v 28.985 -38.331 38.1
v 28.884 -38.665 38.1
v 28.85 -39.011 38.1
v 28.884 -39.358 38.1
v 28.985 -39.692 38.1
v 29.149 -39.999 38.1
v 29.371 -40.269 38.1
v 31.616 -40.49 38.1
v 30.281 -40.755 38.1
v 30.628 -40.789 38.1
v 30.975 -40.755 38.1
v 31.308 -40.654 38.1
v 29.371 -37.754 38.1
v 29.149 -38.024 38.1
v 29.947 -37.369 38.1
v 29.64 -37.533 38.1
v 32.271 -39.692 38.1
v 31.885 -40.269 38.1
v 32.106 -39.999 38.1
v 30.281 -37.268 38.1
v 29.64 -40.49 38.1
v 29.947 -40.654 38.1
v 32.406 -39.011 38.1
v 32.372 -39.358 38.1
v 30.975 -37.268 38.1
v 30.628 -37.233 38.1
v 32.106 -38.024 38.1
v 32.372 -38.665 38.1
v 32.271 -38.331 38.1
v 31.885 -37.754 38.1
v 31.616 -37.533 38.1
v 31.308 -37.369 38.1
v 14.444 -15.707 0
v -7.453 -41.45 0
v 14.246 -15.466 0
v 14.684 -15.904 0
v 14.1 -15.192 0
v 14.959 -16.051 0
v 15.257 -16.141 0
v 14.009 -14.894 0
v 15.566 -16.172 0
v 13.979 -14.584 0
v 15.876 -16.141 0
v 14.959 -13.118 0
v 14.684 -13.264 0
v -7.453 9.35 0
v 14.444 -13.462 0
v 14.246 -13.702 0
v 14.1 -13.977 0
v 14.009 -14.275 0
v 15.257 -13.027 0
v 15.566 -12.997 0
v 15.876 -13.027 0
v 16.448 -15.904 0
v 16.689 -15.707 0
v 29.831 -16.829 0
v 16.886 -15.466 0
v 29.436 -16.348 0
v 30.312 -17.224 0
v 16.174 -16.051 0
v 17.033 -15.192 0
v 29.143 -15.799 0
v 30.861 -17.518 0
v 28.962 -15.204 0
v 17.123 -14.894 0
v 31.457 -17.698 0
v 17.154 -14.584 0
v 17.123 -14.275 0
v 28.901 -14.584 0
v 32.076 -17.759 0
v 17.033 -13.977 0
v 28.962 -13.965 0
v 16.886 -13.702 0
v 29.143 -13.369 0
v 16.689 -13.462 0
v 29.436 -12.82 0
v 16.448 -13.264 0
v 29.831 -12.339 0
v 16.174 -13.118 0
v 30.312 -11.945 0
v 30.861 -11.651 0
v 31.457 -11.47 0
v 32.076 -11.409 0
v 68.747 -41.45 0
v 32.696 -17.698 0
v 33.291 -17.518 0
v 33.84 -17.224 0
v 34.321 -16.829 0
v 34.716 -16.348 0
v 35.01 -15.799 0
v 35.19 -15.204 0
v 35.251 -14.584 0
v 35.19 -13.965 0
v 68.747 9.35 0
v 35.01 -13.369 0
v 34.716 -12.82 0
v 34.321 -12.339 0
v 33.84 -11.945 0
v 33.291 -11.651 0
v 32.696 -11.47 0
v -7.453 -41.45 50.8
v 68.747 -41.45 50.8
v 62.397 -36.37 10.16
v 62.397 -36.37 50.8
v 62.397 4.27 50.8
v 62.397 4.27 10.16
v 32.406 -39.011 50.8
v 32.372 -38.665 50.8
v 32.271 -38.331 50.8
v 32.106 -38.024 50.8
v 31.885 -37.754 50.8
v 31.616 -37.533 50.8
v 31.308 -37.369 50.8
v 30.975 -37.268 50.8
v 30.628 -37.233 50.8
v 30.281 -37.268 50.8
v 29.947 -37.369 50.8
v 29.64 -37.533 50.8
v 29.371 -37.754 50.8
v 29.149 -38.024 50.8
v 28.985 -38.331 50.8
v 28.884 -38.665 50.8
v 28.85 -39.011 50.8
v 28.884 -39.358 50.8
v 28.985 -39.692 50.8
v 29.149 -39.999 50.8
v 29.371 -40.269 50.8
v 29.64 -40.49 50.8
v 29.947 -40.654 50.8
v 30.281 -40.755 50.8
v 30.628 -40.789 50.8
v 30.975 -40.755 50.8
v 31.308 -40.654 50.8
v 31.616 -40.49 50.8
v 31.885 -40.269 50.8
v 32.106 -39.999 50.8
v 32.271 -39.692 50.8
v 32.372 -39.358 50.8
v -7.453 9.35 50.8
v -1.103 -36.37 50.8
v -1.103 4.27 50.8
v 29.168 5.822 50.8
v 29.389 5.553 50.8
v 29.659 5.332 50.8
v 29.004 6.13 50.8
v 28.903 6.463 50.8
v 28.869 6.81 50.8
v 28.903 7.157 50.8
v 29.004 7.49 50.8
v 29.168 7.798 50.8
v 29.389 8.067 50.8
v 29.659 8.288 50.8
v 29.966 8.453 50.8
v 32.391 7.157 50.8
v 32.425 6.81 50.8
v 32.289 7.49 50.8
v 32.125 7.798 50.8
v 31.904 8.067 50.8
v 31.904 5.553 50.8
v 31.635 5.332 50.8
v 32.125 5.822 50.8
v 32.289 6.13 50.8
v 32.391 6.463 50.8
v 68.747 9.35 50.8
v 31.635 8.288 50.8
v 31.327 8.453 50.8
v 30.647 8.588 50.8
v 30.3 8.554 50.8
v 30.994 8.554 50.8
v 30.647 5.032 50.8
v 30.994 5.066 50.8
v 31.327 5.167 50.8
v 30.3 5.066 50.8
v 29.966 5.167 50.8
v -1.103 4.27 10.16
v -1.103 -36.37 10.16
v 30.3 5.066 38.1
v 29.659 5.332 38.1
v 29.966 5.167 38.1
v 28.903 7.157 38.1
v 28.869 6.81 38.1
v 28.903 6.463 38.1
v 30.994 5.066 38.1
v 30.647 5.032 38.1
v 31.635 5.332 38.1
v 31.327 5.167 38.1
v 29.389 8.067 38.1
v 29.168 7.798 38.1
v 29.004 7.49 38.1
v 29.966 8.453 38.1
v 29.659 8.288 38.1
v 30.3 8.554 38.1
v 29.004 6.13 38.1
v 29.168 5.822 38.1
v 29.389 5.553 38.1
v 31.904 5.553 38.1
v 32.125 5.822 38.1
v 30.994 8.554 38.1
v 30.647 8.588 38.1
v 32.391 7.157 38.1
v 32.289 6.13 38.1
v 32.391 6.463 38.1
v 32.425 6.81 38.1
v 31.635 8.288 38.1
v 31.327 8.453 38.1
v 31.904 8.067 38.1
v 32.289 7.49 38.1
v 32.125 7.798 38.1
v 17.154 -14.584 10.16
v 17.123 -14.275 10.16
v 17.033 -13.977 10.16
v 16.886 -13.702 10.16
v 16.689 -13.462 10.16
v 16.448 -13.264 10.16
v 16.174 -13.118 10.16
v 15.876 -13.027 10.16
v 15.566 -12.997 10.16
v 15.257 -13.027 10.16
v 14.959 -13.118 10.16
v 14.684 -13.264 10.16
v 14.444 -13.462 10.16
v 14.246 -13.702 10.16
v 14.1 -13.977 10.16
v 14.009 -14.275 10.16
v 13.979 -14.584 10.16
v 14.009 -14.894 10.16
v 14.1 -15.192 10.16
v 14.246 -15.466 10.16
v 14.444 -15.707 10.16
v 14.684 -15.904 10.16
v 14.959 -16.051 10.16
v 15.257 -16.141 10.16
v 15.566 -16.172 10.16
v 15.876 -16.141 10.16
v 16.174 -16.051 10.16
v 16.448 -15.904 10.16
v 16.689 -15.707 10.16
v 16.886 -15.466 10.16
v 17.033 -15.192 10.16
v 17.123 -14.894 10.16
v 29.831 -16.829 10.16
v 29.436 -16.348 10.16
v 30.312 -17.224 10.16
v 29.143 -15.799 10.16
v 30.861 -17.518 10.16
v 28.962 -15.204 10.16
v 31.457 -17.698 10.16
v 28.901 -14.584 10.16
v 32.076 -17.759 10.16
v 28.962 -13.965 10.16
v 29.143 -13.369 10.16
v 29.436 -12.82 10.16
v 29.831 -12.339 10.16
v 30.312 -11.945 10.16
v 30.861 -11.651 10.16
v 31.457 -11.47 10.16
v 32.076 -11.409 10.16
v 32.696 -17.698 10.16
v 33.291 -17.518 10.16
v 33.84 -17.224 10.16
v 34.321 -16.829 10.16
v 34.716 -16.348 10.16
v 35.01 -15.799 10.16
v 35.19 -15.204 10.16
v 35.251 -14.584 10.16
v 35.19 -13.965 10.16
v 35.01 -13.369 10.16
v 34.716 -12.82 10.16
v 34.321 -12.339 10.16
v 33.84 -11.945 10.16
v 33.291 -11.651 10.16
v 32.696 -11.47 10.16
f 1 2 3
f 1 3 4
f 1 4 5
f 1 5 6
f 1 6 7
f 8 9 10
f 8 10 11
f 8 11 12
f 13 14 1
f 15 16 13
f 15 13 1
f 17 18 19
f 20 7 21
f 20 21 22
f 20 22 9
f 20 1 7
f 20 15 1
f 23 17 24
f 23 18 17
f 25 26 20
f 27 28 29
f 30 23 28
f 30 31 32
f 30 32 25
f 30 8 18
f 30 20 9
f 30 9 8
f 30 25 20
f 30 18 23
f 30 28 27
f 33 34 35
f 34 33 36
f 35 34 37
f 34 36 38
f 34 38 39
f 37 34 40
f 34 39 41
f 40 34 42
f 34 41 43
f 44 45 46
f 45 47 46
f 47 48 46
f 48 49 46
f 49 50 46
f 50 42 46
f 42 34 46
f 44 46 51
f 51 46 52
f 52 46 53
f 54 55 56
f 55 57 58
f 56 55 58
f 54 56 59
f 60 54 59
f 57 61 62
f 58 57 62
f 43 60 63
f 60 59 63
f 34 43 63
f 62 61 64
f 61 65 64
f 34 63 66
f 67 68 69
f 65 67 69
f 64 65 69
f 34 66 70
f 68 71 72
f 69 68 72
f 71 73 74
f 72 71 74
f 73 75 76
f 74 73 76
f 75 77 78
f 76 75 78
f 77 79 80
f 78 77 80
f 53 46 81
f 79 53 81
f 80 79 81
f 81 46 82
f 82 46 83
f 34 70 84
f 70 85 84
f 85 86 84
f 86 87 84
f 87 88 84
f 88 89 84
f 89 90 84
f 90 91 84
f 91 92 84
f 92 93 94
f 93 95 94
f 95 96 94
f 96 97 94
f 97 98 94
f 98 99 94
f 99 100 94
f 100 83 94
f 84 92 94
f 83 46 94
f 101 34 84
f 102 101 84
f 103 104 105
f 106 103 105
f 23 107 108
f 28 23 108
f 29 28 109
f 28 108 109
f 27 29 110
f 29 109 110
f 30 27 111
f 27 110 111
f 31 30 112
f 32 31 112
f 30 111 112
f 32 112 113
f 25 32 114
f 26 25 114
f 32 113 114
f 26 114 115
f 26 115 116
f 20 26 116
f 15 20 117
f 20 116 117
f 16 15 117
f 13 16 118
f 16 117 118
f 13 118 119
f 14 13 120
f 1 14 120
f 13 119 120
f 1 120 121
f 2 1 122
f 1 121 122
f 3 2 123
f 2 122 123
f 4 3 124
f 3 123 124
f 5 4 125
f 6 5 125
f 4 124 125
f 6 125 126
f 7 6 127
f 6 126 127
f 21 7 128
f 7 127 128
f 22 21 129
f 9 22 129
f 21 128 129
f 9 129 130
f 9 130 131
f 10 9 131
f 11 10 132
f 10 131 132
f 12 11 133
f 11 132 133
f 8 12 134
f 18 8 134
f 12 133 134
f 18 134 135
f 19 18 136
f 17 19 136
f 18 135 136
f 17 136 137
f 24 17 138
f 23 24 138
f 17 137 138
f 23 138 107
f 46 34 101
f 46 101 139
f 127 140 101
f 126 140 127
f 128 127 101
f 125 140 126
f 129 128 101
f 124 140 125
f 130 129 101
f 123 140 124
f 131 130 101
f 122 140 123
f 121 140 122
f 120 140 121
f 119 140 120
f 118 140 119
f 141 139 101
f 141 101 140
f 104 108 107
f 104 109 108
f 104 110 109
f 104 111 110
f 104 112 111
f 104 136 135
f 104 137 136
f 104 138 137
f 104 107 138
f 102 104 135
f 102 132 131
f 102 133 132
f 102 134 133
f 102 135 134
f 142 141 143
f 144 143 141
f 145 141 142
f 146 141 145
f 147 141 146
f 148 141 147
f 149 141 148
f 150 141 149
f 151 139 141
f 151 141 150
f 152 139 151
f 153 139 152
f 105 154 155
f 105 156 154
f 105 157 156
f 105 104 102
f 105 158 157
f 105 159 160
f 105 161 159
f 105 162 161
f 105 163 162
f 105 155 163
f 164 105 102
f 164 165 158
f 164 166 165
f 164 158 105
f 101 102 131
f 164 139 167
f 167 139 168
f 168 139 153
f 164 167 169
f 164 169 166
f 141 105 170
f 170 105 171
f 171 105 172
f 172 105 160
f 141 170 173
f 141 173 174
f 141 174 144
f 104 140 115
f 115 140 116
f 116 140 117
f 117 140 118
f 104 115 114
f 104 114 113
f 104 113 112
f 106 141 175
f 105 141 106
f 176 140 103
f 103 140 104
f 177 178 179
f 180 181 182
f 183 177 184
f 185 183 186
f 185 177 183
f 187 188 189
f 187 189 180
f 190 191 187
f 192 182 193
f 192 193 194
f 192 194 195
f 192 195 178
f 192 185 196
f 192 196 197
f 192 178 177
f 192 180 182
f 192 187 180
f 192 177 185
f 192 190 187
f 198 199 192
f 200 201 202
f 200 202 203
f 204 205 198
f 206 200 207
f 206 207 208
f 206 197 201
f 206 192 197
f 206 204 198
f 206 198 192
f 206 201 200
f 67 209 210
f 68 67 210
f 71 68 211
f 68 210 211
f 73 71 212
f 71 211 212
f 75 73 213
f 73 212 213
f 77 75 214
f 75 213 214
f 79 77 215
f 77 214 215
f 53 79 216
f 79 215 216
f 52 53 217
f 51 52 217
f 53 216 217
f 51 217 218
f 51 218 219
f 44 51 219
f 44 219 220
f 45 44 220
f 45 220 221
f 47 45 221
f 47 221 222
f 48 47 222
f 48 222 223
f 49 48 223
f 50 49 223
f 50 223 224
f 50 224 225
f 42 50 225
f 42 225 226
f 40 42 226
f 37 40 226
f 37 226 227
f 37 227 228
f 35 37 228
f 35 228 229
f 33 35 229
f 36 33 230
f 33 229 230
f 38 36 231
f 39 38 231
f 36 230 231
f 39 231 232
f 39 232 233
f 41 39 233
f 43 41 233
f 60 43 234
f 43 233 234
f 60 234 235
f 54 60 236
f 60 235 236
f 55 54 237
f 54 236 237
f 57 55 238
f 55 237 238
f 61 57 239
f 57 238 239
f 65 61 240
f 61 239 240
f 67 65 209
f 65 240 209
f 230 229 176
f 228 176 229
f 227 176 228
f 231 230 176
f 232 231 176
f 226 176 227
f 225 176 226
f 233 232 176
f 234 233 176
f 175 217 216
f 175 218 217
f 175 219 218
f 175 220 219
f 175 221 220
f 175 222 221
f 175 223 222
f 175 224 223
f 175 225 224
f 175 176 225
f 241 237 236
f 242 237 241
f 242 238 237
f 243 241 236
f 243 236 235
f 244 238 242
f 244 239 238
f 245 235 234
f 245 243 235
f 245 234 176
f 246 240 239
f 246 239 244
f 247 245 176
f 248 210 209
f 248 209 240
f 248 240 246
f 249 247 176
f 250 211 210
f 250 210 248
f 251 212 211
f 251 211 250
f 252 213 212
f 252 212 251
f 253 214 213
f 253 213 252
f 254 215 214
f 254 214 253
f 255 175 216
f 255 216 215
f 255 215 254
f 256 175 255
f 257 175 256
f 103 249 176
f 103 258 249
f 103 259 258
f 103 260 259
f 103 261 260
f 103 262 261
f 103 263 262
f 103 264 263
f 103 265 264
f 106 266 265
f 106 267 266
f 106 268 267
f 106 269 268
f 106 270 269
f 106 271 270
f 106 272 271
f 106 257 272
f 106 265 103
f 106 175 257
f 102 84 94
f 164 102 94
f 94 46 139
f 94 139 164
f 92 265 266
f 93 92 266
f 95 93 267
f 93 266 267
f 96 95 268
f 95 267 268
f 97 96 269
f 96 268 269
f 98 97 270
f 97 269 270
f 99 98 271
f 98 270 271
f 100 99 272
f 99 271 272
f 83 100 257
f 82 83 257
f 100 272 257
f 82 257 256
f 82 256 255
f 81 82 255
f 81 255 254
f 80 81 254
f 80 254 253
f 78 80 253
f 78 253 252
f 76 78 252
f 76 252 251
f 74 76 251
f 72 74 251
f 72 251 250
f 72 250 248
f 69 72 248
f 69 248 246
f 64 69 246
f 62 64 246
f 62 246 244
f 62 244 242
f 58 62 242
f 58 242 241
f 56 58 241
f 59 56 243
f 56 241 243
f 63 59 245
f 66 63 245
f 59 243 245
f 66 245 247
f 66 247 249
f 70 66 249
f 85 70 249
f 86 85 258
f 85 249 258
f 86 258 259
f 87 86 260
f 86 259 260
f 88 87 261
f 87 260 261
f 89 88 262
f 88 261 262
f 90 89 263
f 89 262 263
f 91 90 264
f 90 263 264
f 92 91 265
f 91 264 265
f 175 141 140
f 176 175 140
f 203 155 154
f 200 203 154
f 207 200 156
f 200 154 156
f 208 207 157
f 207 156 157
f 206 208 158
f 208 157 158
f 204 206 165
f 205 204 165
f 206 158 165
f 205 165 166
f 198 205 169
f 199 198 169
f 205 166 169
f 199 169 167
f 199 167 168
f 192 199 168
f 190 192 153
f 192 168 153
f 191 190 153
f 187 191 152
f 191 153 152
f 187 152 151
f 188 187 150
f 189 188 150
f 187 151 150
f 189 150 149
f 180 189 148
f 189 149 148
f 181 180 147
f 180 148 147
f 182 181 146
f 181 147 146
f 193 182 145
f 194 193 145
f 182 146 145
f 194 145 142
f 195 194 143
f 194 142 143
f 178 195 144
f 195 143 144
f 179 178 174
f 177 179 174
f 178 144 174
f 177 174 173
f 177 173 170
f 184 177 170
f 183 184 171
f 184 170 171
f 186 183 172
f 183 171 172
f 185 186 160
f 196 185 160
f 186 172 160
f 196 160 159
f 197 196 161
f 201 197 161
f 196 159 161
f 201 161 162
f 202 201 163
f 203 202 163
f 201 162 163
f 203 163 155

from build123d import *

# Parameters (mm, degrees)
SKETCH9_W           = 76.2
SKETCH9_H           = 50.8
BOSS_EXTRUDE2_DEPTH = 50.8
SKETCH10_W          = 63.5
SKETCH10_H          = 20.32
CUT_EXTRUDE3_DEPTH  = 40.64
SKETCH11_R          = 1.5875
SKETCH11_R_2        = 3.175
CUT_EXTRUDE4_DEPTH  = 90.976761381
SKETCH12_R          = 1.778
CUT_EXTRUDE5_DEPTH  = 12.7
SKETCH19_R          = 1.778
CUT_EXTRUDE9_DEPTH  = 12.7


with BuildPart() as part:
    # Sketch9 → Boss-Extrude2 (new body)
    with BuildSketch(Plane.XY):
        with Locations((30.646725964, -16.049917464)):
            Rectangle(SKETCH9_W, SKETCH9_H)
    extrude(amount=BOSS_EXTRUDE2_DEPTH)

    # Sketch10 → Cut-Extrude3 (cut)
    with BuildSketch(Plane.XY.offset(50.8)):
        with Locations((30.646725964, -5.889917464)):
            Rectangle(SKETCH10_W, SKETCH10_H)
        with Locations((30.646725964, -26.209917464)):
            Rectangle(SKETCH10_W, SKETCH10_H)
    extrude(amount=-CUT_EXTRUDE3_DEPTH, mode=Mode.SUBTRACT)

    # Sketch11 → Cut-Extrude4 (cut, through all)
    with BuildSketch(Plane.XY.offset(10.16)):
        with Locations((15.566258562, -14.584417496)):
            Circle(SKETCH11_R)
        with Locations((32.076258562, -14.584417496)):
            Circle(SKETCH11_R_2)
    extrude(amount=-CUT_EXTRUDE4_DEPTH, mode=Mode.SUBTRACT)

    # Sketch12 → Cut-Extrude5 (cut)
    with BuildSketch(Plane.XY.offset(50.8)):
        with Locations((30.646725964, 6.810082536)):
            Circle(SKETCH12_R)
    extrude(amount=-CUT_EXTRUDE5_DEPTH, mode=Mode.SUBTRACT)

    # Sketch19 → Cut-Extrude9 (cut)
    with BuildSketch(Plane.XY.offset(50.8)):
        with Locations((30.627843478, -39.011499114)):
            Circle(SKETCH19_R)
    extrude(amount=-CUT_EXTRUDE9_DEPTH, mode=Mode.SUBTRACT)


solid = part.part
